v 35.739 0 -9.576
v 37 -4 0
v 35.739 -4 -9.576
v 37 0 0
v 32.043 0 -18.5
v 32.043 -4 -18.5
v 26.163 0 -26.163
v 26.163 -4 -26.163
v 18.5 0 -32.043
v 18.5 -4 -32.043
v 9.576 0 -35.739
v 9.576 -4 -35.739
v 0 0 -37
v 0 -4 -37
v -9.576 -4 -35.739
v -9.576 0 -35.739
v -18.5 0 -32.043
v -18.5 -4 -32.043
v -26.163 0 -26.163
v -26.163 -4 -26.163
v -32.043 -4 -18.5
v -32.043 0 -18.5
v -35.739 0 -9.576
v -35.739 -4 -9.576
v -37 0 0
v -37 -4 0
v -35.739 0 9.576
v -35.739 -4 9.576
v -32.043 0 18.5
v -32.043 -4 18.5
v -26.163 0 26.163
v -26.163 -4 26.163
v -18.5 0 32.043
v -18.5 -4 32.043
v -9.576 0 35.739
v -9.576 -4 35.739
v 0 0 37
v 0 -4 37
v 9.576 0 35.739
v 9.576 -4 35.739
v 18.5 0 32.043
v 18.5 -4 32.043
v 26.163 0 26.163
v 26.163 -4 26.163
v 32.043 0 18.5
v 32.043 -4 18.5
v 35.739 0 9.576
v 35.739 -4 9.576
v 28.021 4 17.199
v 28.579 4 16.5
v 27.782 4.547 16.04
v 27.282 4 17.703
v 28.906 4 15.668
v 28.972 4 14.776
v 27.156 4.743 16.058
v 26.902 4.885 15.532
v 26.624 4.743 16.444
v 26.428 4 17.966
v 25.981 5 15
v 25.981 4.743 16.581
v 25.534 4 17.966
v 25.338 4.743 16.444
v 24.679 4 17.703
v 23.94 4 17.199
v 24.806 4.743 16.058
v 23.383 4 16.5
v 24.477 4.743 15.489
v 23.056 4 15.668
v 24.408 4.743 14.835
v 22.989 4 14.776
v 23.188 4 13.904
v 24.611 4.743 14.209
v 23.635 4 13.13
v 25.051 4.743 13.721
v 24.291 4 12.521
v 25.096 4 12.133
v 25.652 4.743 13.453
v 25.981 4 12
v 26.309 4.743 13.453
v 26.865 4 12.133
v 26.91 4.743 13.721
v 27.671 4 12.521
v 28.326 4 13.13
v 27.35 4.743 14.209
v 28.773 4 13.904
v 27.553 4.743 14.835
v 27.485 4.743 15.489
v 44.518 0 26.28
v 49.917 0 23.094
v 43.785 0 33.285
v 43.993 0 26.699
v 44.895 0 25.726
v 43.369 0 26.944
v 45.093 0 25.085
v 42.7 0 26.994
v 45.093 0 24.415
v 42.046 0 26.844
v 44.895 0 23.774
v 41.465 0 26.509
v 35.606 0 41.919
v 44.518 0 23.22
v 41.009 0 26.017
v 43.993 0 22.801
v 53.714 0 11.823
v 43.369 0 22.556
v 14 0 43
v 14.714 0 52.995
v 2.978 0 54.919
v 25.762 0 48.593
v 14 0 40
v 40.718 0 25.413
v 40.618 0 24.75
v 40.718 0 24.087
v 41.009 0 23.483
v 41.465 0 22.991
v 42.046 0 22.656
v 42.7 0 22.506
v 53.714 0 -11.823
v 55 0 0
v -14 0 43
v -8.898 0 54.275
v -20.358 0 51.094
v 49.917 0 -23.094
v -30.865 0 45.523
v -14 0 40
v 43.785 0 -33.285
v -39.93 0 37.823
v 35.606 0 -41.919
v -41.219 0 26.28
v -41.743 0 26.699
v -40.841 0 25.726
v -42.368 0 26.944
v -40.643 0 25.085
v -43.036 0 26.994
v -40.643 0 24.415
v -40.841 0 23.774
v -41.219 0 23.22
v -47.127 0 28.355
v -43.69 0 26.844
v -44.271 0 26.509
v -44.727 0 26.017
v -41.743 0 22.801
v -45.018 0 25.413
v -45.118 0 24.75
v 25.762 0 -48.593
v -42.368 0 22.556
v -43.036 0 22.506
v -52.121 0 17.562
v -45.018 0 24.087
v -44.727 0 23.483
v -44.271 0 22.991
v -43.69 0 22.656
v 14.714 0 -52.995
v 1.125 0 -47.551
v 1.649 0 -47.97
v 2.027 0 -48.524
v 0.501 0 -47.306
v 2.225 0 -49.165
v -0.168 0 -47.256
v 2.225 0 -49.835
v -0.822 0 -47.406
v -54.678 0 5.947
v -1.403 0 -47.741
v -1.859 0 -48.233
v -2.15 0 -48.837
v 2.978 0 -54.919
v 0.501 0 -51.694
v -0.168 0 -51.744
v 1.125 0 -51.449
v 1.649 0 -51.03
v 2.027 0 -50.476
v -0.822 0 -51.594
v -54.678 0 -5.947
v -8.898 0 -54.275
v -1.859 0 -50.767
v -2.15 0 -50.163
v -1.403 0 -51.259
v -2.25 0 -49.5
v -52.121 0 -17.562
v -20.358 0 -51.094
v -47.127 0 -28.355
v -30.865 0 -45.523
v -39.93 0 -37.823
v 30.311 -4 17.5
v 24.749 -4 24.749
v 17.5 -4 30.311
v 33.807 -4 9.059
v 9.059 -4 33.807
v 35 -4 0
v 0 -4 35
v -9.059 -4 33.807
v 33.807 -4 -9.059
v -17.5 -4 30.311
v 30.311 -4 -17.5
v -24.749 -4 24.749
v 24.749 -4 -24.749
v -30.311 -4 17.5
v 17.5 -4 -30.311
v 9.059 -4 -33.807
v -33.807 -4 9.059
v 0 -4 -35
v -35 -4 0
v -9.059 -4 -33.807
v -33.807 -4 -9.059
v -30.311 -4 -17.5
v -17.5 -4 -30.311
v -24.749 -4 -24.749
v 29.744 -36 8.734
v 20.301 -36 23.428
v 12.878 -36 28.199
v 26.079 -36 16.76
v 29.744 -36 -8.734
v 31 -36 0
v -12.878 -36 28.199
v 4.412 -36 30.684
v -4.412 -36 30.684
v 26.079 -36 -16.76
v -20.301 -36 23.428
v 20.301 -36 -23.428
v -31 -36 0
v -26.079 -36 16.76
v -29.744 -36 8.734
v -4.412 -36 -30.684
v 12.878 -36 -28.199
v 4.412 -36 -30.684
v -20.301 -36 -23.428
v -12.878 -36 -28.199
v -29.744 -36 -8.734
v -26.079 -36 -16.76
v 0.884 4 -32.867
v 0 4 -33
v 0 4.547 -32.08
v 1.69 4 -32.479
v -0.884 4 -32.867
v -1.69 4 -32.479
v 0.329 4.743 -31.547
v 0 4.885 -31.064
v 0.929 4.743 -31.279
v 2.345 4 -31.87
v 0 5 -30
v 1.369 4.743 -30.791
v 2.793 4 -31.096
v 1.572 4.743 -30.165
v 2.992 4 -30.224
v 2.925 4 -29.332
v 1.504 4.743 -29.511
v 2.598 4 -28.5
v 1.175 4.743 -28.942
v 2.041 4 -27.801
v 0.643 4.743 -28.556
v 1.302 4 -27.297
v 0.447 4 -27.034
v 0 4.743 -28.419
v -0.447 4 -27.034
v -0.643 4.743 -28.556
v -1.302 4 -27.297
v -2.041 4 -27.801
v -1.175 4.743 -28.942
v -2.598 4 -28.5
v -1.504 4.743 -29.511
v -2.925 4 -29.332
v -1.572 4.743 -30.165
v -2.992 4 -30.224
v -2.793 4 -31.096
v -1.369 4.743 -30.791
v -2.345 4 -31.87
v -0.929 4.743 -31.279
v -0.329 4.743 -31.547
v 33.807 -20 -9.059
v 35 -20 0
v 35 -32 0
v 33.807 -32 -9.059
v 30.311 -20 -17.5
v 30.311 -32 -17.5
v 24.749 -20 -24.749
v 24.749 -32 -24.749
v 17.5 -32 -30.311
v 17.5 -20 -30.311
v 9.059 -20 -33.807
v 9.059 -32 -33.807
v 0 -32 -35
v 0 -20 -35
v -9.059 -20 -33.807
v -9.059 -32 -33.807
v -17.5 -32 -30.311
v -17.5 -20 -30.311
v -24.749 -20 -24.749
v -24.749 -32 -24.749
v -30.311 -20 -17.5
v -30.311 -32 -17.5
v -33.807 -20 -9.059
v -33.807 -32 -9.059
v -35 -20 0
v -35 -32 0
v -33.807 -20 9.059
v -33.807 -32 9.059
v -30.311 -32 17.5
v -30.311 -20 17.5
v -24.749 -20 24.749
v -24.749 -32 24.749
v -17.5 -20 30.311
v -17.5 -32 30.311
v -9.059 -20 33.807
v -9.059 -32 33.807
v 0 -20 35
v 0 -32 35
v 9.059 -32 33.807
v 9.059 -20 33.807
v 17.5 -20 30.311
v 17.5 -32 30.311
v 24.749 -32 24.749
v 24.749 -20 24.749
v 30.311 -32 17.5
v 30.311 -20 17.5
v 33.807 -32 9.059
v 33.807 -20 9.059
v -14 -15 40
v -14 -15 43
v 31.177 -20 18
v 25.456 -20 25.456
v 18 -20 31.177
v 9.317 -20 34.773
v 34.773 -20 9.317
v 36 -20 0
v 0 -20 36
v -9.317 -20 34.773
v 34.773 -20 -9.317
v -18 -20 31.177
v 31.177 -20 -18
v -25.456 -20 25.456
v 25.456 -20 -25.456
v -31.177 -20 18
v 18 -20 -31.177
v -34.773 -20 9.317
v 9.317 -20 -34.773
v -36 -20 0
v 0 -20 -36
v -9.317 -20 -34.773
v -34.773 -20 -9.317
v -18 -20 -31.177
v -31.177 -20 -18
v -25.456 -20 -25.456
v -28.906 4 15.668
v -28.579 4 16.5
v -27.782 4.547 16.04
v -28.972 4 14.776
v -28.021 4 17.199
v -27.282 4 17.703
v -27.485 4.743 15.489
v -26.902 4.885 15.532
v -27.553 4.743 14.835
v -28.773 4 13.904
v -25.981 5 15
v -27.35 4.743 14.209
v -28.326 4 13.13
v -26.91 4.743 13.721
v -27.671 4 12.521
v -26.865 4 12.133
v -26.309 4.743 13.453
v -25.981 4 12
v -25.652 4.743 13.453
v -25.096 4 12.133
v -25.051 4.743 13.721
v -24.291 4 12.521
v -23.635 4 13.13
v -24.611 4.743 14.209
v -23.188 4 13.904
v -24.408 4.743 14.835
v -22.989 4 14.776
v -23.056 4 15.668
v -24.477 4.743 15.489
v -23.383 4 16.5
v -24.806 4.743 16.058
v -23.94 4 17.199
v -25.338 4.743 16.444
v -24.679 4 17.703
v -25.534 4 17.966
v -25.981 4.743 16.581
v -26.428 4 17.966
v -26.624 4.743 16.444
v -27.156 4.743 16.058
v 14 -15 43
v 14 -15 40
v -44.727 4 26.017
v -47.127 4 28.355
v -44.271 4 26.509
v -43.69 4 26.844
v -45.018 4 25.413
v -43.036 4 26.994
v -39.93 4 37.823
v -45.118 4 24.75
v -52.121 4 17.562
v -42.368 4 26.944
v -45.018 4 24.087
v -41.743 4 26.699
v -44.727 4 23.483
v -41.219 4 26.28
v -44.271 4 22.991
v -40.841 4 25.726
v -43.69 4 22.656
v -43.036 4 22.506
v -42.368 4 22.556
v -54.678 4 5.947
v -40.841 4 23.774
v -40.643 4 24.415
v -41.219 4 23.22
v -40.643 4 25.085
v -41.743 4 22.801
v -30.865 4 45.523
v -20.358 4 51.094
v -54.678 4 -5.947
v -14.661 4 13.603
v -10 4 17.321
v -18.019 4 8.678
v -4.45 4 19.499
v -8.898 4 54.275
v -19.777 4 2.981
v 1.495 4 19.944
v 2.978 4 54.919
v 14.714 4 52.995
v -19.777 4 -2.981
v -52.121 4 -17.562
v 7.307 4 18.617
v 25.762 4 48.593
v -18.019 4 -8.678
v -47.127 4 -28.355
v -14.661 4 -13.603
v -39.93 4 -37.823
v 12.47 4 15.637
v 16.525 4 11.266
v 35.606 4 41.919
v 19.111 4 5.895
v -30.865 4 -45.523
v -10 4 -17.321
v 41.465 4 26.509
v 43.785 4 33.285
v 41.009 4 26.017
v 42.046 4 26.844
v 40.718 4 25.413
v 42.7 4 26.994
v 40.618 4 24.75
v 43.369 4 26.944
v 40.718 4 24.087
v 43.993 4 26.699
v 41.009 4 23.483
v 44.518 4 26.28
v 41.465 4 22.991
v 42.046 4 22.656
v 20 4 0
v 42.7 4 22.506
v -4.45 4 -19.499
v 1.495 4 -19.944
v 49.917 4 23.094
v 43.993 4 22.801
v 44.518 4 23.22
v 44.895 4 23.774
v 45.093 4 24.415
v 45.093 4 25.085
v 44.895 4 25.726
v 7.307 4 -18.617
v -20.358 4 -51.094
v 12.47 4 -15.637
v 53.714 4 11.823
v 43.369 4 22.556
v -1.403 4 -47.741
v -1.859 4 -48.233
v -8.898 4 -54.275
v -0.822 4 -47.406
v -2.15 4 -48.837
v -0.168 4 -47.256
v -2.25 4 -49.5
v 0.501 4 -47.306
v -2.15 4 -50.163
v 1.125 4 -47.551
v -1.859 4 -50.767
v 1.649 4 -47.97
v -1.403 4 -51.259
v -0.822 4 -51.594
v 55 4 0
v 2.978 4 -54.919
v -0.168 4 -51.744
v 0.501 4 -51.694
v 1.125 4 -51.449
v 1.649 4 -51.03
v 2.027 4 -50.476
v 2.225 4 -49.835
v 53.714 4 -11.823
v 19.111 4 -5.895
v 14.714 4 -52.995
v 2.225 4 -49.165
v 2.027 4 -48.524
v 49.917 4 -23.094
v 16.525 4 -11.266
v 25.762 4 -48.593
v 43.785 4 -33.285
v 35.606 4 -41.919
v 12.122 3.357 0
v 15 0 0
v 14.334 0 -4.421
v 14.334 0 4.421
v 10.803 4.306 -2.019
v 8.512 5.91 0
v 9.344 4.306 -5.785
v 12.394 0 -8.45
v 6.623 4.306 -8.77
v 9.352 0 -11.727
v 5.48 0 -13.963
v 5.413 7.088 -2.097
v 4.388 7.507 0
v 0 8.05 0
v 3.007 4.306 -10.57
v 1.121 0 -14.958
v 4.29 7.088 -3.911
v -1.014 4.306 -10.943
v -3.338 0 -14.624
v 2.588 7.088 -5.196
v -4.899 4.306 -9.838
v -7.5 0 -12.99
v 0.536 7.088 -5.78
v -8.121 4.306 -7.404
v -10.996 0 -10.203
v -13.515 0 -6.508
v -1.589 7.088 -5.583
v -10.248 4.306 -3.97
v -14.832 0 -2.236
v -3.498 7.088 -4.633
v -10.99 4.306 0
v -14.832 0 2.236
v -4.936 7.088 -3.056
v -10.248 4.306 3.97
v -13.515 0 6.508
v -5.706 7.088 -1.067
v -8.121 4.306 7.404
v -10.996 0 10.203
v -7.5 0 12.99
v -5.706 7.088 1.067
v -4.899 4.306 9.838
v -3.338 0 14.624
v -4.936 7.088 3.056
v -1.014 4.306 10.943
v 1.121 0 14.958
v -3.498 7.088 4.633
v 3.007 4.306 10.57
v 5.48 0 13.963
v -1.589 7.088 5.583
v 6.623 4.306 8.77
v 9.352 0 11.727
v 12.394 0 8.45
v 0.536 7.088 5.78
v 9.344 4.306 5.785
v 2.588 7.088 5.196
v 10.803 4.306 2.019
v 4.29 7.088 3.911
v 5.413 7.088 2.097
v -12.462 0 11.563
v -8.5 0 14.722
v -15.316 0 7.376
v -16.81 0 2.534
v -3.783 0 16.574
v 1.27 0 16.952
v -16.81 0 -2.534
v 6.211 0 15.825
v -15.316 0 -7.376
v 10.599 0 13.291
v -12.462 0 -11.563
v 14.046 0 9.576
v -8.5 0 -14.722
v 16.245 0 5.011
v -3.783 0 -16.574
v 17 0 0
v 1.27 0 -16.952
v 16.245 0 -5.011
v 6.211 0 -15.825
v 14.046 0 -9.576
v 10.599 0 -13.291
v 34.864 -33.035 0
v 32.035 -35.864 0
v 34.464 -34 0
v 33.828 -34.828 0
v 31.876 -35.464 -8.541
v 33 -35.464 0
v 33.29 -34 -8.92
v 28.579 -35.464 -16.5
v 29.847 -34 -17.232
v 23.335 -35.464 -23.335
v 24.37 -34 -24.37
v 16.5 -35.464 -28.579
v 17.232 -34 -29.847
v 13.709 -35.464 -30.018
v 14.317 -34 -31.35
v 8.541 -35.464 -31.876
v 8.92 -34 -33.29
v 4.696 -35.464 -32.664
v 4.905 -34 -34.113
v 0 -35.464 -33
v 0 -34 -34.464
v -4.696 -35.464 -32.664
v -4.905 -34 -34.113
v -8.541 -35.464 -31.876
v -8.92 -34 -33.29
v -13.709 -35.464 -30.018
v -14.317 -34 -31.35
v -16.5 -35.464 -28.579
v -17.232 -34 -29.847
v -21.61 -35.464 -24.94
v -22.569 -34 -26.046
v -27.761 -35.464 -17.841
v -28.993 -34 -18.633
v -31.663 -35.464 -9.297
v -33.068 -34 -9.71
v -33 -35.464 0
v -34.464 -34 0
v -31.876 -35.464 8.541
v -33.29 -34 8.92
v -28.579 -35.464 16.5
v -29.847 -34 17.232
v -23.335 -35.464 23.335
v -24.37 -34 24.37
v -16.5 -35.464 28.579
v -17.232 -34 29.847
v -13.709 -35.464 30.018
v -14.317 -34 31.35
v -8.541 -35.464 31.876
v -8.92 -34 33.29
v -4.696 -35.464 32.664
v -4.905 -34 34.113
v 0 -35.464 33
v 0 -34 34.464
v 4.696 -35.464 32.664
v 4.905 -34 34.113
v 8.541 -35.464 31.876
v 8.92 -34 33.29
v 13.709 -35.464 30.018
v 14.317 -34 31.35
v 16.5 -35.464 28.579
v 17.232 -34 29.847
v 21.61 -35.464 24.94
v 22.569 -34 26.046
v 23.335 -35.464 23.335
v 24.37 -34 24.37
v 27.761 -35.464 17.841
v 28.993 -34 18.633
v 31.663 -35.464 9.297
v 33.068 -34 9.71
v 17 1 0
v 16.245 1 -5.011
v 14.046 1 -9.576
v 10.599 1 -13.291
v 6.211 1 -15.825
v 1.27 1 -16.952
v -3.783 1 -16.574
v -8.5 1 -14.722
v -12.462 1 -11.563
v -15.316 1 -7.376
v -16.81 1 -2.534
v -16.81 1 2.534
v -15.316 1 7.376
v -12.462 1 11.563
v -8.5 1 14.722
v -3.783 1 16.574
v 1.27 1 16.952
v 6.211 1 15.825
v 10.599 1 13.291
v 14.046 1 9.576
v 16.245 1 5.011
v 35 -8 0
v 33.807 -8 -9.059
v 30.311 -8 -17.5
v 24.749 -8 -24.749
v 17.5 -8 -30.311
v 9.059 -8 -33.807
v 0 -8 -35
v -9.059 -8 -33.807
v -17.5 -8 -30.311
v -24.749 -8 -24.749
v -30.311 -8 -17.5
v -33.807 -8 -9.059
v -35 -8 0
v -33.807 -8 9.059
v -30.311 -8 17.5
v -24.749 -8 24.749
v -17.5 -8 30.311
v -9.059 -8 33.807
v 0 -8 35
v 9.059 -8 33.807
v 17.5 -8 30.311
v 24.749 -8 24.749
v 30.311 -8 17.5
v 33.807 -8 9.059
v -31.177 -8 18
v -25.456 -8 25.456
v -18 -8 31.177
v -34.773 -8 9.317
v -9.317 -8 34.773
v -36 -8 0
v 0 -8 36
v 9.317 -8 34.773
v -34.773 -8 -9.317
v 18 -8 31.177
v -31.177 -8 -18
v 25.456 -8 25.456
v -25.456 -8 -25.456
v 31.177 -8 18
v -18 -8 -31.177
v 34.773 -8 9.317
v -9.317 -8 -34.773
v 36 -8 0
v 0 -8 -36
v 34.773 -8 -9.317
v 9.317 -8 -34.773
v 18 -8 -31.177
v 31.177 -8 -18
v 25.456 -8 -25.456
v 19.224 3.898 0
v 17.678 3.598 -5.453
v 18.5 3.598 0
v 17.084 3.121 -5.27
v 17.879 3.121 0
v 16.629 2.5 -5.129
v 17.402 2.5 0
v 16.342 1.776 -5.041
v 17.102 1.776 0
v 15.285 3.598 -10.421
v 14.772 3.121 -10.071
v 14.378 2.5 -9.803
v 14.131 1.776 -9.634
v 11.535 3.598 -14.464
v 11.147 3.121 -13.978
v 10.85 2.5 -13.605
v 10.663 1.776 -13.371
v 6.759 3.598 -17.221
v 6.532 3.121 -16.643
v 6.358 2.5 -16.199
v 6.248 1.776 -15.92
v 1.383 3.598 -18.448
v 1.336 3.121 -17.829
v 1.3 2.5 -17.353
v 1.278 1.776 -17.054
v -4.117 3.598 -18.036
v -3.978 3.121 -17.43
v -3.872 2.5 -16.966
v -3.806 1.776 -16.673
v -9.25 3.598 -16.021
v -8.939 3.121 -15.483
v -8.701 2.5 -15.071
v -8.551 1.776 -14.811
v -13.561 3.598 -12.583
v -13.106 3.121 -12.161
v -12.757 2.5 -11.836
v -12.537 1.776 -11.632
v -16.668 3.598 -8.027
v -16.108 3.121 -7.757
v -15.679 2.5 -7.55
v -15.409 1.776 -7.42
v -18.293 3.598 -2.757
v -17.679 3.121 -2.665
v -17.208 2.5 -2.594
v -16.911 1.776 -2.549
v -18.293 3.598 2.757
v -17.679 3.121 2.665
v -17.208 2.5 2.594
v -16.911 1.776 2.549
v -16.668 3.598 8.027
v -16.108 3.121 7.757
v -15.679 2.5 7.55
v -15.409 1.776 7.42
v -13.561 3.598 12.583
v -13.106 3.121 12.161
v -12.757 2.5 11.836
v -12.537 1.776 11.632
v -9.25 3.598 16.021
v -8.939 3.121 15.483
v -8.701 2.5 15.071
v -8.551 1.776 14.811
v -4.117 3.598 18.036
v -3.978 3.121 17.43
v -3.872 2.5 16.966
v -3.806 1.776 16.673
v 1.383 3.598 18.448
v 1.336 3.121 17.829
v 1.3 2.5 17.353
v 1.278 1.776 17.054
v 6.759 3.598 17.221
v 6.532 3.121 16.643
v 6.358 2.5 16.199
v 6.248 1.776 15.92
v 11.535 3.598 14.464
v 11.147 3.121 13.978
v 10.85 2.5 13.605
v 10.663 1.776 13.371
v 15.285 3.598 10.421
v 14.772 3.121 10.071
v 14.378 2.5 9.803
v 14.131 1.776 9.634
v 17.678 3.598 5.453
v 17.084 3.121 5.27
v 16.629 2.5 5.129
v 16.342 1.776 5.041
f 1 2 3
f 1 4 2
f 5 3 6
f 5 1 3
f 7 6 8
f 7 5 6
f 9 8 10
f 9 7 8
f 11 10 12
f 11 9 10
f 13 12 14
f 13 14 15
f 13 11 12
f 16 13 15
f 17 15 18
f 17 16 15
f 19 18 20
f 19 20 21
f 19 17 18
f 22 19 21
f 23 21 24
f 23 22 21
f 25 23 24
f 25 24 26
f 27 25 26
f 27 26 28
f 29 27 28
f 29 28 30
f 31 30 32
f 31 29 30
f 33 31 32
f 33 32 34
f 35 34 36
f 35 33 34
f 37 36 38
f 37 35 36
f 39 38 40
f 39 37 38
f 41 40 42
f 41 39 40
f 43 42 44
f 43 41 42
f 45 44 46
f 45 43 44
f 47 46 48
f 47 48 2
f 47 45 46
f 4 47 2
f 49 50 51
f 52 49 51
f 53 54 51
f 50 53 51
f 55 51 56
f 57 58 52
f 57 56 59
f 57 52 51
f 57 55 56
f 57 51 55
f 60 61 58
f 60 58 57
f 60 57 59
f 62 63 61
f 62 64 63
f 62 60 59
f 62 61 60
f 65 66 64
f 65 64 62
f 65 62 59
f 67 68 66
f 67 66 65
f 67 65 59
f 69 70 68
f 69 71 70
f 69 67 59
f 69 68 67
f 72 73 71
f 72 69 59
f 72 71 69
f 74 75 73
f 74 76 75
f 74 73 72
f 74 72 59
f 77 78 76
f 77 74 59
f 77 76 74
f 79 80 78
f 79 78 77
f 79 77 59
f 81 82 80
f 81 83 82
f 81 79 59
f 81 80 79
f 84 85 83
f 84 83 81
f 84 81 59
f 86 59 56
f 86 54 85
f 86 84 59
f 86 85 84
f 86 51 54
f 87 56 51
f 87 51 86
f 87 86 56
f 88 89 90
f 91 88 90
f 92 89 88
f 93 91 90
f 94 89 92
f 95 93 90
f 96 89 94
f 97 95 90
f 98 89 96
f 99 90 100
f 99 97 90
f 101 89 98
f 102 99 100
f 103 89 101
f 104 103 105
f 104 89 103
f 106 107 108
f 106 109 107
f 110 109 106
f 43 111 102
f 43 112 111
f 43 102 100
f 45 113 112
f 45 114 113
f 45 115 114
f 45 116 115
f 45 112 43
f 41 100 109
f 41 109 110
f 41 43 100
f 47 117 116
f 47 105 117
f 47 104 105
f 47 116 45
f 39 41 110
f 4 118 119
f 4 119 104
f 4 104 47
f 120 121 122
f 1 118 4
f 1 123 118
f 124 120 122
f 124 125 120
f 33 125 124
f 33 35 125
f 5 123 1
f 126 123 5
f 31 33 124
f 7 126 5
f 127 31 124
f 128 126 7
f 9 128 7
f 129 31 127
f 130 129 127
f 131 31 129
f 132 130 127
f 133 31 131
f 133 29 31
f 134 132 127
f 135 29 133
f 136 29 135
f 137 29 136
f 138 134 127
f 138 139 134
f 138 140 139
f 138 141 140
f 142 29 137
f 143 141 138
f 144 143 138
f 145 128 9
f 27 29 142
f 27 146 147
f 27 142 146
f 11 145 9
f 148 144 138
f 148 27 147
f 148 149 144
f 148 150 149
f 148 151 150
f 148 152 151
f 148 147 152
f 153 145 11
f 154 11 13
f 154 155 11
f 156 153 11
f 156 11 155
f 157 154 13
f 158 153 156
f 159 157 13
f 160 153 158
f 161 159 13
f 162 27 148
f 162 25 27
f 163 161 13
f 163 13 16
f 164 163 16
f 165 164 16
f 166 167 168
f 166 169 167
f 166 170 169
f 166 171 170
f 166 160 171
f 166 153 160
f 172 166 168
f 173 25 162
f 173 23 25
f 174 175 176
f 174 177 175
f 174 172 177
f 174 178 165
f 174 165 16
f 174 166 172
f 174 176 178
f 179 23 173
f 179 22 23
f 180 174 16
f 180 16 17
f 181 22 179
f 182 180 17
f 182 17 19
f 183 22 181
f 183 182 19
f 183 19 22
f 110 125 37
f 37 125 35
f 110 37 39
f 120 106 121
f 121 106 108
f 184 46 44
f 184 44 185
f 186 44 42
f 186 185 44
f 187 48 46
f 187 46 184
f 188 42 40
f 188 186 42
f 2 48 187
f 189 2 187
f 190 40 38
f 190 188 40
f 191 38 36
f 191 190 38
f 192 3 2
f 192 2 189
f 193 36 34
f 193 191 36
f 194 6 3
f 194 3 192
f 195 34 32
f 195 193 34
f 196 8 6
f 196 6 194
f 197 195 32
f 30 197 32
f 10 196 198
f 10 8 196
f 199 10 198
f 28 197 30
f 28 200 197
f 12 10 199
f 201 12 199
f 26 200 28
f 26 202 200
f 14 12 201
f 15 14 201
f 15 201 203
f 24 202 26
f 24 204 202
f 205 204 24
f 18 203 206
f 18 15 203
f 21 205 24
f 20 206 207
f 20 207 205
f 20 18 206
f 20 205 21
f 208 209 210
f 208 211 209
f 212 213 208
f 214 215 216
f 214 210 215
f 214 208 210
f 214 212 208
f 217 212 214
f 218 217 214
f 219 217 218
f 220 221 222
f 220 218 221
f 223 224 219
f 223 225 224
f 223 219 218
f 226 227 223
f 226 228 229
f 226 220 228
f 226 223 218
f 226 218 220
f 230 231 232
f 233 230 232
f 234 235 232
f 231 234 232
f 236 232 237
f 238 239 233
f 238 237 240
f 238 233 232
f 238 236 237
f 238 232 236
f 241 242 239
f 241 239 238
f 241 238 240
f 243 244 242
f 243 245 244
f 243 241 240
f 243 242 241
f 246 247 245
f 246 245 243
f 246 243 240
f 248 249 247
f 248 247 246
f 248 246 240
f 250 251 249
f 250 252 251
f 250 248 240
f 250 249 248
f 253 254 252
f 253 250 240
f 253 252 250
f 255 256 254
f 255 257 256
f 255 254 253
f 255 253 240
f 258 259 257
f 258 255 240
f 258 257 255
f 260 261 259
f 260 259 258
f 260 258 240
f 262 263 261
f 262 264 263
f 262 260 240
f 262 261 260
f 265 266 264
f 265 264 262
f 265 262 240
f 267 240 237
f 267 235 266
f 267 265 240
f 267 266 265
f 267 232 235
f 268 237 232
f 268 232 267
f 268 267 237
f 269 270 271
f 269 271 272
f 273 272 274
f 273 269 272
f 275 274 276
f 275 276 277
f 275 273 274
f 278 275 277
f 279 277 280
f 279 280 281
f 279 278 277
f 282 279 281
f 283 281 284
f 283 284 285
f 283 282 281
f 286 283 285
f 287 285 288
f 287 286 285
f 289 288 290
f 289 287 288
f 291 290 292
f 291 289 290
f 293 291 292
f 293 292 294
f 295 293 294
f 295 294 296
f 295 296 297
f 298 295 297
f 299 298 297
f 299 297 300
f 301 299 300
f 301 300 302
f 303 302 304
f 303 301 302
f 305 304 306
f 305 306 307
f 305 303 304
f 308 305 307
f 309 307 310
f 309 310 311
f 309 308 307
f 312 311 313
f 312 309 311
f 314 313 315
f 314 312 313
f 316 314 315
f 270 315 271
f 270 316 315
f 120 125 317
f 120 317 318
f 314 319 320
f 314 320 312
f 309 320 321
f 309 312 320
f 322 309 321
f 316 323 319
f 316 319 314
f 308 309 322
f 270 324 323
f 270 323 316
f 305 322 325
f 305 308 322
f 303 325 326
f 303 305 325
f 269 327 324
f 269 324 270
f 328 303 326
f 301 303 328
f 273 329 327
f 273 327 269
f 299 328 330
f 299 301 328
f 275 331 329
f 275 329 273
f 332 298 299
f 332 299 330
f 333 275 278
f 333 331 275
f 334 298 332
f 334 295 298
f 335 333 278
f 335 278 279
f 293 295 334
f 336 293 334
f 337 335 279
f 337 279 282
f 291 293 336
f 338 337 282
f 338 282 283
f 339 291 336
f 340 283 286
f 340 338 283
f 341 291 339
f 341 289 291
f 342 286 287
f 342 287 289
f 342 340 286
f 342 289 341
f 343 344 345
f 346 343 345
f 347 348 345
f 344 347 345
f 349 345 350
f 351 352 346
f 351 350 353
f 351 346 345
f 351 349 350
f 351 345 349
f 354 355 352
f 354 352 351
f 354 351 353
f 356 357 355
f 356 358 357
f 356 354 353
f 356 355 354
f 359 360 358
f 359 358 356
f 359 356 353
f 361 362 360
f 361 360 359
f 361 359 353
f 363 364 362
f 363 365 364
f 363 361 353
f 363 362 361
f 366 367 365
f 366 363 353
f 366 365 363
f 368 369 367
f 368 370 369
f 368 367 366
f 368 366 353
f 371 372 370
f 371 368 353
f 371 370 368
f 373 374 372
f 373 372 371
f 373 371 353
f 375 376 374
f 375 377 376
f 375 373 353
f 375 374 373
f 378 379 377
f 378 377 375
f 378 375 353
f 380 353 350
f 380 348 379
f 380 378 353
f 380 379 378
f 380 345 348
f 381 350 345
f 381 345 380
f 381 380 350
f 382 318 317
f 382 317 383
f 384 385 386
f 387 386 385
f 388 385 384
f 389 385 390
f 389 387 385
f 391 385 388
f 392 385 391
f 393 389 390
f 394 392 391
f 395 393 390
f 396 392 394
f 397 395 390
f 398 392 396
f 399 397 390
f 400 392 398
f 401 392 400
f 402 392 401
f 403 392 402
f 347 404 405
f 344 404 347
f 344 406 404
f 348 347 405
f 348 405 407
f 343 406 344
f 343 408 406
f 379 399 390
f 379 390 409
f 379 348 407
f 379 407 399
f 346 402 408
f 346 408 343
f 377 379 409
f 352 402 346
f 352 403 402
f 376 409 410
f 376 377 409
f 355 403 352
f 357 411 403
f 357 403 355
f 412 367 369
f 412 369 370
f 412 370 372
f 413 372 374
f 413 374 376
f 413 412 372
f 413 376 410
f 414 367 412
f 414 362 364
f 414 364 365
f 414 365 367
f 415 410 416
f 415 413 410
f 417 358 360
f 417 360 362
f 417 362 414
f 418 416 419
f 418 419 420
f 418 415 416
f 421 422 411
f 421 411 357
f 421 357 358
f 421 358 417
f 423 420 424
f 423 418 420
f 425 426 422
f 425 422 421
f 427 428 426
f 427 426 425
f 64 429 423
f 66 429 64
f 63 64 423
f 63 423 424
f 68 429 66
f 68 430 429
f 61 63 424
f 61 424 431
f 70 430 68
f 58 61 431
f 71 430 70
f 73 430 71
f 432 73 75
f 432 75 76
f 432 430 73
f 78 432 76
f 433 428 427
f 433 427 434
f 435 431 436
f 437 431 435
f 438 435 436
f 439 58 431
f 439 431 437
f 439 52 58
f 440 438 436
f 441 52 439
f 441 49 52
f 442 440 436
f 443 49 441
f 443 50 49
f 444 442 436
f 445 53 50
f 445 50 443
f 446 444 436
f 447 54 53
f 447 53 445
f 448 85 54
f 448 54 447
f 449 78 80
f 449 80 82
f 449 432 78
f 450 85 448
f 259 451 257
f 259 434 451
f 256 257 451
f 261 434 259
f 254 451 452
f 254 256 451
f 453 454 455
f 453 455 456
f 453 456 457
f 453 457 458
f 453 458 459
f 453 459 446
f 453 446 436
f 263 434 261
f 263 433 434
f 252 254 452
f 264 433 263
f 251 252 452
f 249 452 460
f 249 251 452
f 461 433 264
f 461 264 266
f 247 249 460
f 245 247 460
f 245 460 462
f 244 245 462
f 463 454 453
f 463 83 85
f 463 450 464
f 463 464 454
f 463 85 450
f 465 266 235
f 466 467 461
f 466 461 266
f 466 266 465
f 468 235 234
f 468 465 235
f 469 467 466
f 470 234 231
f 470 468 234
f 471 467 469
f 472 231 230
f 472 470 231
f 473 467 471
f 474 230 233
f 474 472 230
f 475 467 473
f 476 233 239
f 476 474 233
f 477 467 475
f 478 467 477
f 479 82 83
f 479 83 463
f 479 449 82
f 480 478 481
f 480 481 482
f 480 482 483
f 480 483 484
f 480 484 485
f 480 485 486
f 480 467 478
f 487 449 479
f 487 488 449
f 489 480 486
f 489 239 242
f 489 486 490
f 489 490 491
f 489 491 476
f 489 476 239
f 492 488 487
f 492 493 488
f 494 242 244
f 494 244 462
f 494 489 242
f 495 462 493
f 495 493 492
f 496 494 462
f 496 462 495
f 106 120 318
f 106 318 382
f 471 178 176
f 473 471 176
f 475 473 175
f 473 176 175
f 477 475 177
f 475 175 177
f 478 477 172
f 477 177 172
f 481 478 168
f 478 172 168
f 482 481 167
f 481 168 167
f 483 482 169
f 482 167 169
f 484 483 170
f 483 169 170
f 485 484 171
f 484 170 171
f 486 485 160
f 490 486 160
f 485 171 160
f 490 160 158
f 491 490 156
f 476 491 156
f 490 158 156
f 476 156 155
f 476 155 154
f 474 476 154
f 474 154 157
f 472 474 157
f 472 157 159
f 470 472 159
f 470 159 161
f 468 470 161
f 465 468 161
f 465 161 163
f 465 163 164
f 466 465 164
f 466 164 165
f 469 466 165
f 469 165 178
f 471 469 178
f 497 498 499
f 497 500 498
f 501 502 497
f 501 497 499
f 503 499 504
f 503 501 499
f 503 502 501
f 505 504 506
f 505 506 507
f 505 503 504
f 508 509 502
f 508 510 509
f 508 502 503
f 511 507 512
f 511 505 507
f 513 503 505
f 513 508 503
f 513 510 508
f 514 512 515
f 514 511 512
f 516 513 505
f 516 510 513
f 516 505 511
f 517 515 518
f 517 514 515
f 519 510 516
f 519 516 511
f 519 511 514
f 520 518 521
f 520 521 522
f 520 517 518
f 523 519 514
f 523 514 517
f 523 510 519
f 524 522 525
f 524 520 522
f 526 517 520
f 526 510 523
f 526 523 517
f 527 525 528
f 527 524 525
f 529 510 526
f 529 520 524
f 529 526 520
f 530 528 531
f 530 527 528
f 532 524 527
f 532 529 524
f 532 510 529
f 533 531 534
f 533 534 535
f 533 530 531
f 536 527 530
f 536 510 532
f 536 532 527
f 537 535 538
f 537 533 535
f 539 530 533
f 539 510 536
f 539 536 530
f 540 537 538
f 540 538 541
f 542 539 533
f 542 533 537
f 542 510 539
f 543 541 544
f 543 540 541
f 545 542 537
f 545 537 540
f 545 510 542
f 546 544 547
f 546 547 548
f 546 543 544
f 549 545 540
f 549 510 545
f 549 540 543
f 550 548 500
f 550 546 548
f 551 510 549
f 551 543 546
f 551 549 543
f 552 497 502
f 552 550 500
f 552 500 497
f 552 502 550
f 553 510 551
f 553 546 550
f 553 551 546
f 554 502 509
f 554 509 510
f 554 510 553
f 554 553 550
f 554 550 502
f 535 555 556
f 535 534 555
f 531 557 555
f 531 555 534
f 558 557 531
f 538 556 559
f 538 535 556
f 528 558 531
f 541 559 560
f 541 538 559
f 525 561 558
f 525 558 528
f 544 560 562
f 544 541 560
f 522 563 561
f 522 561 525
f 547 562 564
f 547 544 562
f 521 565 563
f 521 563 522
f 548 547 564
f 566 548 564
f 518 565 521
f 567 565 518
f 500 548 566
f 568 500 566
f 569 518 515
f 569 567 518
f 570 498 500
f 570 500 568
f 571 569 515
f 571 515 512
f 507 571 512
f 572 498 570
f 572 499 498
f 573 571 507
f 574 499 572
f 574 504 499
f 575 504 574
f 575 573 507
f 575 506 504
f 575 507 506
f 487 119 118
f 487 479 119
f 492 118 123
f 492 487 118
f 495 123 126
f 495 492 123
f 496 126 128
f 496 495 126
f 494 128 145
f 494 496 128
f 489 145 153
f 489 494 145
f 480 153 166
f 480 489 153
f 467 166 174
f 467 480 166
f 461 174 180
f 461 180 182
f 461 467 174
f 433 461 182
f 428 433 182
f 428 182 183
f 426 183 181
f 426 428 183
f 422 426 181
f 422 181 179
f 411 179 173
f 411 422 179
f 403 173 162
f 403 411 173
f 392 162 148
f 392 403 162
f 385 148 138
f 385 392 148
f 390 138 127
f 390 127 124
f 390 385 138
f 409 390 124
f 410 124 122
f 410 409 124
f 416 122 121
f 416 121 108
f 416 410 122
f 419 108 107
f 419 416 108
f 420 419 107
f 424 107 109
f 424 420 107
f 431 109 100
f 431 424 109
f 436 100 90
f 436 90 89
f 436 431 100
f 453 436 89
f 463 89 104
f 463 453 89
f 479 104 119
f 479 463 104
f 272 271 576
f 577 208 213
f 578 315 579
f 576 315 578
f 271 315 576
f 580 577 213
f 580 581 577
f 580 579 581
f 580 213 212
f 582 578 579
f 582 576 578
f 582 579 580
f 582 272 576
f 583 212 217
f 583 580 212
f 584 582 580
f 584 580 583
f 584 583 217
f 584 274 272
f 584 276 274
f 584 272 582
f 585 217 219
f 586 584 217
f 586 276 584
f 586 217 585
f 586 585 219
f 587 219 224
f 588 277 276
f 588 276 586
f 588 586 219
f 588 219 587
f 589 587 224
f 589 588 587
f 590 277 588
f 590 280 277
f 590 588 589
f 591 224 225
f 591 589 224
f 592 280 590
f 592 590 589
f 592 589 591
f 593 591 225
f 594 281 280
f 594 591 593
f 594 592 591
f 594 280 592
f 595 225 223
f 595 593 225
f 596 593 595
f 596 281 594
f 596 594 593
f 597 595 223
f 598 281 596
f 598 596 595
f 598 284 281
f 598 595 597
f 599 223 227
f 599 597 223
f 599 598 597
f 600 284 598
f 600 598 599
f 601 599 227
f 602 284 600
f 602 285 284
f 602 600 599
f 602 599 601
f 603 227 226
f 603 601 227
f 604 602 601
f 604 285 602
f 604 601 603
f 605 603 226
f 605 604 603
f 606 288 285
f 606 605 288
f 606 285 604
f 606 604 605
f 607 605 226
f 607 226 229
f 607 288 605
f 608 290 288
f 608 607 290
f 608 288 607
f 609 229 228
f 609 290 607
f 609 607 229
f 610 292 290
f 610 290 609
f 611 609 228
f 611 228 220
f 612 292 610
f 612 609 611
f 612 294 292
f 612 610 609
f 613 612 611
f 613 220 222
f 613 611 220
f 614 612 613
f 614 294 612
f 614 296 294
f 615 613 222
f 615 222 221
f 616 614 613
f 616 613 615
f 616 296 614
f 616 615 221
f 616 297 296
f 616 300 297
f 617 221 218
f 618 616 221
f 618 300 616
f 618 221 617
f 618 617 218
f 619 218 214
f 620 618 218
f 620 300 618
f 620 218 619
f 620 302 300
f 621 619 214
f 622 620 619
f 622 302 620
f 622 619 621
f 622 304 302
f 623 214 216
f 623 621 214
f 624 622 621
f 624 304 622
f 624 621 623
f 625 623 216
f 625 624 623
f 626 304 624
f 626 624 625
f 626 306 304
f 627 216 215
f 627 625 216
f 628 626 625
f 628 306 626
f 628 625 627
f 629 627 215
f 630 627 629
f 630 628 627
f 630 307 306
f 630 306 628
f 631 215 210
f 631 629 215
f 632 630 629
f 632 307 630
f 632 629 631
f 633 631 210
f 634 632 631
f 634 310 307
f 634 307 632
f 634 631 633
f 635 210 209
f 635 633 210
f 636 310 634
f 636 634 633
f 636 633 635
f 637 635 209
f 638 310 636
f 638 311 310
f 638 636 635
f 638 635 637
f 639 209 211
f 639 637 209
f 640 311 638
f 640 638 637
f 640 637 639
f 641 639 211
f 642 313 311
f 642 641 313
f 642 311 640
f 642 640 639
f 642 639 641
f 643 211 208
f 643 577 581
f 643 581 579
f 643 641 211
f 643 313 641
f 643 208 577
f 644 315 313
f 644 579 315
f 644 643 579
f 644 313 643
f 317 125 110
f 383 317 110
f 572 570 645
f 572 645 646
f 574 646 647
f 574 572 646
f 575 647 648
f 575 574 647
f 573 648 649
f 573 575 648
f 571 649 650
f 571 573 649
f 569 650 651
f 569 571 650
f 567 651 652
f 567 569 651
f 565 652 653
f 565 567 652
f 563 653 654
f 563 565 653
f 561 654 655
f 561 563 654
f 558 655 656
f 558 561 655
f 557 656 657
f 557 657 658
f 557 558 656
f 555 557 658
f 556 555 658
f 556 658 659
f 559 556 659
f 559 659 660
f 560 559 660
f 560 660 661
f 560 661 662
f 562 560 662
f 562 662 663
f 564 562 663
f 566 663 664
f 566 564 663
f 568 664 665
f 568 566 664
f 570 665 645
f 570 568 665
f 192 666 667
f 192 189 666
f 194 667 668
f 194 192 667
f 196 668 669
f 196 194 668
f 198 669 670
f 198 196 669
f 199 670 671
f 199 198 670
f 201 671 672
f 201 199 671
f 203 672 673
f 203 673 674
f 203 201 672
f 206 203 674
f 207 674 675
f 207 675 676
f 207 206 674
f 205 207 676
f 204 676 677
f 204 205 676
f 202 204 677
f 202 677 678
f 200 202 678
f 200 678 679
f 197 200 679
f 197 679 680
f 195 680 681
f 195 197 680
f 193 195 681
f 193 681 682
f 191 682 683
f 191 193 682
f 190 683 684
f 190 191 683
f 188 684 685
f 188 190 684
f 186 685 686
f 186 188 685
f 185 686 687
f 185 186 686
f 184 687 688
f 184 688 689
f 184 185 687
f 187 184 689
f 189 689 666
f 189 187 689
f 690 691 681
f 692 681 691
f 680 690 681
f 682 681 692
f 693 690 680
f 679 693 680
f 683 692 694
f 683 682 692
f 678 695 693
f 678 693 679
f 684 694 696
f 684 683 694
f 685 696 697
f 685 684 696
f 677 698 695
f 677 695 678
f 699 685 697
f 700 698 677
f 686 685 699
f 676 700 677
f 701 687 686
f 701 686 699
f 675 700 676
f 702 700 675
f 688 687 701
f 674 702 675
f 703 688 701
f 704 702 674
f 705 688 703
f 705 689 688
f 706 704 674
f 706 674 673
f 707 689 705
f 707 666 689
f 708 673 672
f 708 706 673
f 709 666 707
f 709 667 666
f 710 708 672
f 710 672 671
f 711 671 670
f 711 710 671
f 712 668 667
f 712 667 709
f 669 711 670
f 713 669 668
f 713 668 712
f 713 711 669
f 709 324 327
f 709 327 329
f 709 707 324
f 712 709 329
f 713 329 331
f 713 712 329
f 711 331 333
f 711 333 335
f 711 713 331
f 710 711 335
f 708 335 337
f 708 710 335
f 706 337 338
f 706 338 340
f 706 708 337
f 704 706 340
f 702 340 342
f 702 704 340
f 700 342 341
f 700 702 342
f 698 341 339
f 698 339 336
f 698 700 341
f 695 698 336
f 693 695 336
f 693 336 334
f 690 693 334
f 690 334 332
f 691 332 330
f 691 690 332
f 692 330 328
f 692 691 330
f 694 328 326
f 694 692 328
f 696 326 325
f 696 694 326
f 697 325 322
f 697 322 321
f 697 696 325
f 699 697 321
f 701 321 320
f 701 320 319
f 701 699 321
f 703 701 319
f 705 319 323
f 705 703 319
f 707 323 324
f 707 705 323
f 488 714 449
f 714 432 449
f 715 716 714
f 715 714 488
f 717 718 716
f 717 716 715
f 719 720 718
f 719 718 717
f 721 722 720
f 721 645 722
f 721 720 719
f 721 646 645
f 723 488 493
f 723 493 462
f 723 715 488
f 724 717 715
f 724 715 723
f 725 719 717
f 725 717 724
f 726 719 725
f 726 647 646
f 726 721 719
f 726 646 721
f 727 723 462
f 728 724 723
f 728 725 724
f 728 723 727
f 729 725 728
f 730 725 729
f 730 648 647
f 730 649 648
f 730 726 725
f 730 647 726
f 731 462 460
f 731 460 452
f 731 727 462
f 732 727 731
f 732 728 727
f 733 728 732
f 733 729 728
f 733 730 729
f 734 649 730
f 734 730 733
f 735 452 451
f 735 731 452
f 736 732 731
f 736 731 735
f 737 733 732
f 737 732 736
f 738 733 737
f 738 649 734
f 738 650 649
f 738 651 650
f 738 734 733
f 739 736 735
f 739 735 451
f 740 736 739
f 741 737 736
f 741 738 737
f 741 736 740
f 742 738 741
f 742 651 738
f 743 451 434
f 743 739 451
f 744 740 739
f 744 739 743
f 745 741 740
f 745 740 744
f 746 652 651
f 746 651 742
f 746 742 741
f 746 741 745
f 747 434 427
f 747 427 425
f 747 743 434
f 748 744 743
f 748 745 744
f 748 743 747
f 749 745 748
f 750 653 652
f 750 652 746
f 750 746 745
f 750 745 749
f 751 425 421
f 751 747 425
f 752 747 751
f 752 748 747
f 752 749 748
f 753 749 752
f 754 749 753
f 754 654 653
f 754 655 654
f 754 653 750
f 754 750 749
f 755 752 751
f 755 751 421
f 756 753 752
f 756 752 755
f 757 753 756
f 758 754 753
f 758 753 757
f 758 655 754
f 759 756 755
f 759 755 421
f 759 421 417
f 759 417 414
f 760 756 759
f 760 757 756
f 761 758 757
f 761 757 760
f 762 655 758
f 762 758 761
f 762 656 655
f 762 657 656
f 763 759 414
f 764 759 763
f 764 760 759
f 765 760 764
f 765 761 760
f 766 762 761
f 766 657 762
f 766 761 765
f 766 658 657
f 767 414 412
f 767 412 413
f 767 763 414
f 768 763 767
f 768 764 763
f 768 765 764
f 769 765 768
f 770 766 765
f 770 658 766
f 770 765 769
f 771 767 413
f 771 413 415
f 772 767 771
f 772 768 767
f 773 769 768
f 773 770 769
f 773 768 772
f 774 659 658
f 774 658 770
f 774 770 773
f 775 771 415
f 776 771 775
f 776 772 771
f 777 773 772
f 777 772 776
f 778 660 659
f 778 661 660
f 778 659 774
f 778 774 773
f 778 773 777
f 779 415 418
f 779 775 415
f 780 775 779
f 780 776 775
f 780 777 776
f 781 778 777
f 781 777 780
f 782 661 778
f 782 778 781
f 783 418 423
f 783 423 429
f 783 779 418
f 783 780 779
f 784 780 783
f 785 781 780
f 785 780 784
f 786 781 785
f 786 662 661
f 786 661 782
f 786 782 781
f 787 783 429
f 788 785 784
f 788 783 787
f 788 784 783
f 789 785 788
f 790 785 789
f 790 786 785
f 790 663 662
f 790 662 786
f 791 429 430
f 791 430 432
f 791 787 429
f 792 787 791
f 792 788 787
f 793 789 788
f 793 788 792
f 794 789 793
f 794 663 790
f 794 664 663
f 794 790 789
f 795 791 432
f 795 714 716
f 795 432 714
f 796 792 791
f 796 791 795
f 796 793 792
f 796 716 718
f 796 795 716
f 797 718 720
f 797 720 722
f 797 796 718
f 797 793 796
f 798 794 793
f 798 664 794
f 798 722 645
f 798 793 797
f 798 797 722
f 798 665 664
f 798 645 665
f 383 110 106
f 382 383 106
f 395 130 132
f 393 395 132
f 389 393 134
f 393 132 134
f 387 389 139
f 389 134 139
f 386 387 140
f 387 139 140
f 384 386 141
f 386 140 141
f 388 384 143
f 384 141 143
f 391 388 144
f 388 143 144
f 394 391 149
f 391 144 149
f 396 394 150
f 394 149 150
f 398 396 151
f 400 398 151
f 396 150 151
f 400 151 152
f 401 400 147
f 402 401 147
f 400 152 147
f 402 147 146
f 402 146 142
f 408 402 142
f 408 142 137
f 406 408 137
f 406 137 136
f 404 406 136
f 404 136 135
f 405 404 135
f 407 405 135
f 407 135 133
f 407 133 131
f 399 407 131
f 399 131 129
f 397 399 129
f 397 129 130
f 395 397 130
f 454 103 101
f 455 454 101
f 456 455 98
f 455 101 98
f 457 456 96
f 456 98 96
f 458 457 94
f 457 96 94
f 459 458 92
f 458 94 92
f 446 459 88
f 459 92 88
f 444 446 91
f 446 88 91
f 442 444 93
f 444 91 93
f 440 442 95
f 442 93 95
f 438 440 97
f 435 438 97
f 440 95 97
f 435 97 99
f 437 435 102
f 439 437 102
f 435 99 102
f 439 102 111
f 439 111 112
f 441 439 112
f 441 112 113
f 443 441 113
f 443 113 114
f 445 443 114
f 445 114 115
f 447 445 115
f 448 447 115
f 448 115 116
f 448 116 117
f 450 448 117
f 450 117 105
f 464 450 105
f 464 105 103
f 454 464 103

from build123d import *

# Parameters (mm, degrees)
FILLET1_R                = 4
FILLET2_R                = 3
M4_CLEARANCE_HOLE1_D     = 4.5
M4_CLEARANCE_HOLE1_DEPTH = 12
CIRPATTERN1_COUNT        = 3
SKETCH7_W                = 28
SKETCH7_H                = 3
BOSS_EXTRUDE1_DEPTH      = 15


with BuildPart() as part:
    # Sketch2 → Revolve1 (revolve)
    with BuildSketch(Plane.XY):
        with BuildLine():
            Line((0, 8.050125629), (0, -36))
            Line((0, -36), (35, -36))
            Line((35, -36), (35, -20))
            Line((35, -20), (36, -20))
            Line((36, -20), (36, -8))
            Line((36, -8), (35, -8))
            Line((35, -8), (35, -4))
            Line((35, -4), (37, -4))
            Line((37, -4), (37, 0))
            Line((37, 0), (55, 0))
            Line((55, 0), (55, 4))
            Line((55, 4), (17, 4))
            Line((17, 4), (17, 0))
            Line((17, 0), (15, 0))
            ThreePointArc((15, 0), (8.511822993, 5.91041785), (0, 8.050125629))
        make_face()
    revolve(axis=Axis((0, 0, 0), (0, 1, 0)))

    # Fillet1
    fillet1_edges = [part.edges().sort_by_distance(p)[0] for p in [
        (-35, -36, 0),
    ]]
    fillet(fillet1_edges, radius=FILLET1_R)

    # Fillet2
    fillet2_edges = [part.edges().sort_by_distance(p)[0] for p in [
        (-17, 4, 0),
    ]]
    fillet(fillet2_edges, radius=FILLET2_R)

    # M4 Clearance Hole1
    with Locations(Plane(origin=(0, 4, 0), x_dir=(1, 0, 0), z_dir=(0, 1, 0))):
        with Locations((0, 49.5)):
            m4_clearance_hole1 = Hole(M4_CLEARANCE_HOLE1_D / 2, depth=M4_CLEARANCE_HOLE1_DEPTH)

    # Sketch6 → Revolve3 (revolve)
    with BuildSketch(Plane(origin=(0, 0, 0), x_dir=(0, 0, -1), z_dir=(1, 0, 0))):
        with BuildLine():
            Line((33, 4), (30, 4))
            Line((30, 4), (30, 5))
            ThreePointArc((30, 5), (31.58113883, 4.74341649), (33, 4))
        make_face()
    revolve3 = revolve(axis=Axis((0, 5, -30), (0, -1, 0)))

    # CirPattern1: M4 Clearance Hole1, Revolve3 ×3 about axis
    cirpattern1_axis = Axis((0, 0, 0), (0, 1, 0))
    for i in range(1, CIRPATTERN1_COUNT):
        add(m4_clearance_hole1.rotate(cirpattern1_axis, i * 360 / CIRPATTERN1_COUNT), mode=Mode.SUBTRACT)
        add(revolve3.rotate(cirpattern1_axis, i * 360 / CIRPATTERN1_COUNT))

    # Sketch7 → Boss-Extrude1 (add)
    with BuildSketch(Plane.XZ):
        with Locations((0, 41.5)):
            Rectangle(SKETCH7_W, SKETCH7_H)
    extrude(amount=BOSS_EXTRUDE1_DEPTH)


solid = part.part
